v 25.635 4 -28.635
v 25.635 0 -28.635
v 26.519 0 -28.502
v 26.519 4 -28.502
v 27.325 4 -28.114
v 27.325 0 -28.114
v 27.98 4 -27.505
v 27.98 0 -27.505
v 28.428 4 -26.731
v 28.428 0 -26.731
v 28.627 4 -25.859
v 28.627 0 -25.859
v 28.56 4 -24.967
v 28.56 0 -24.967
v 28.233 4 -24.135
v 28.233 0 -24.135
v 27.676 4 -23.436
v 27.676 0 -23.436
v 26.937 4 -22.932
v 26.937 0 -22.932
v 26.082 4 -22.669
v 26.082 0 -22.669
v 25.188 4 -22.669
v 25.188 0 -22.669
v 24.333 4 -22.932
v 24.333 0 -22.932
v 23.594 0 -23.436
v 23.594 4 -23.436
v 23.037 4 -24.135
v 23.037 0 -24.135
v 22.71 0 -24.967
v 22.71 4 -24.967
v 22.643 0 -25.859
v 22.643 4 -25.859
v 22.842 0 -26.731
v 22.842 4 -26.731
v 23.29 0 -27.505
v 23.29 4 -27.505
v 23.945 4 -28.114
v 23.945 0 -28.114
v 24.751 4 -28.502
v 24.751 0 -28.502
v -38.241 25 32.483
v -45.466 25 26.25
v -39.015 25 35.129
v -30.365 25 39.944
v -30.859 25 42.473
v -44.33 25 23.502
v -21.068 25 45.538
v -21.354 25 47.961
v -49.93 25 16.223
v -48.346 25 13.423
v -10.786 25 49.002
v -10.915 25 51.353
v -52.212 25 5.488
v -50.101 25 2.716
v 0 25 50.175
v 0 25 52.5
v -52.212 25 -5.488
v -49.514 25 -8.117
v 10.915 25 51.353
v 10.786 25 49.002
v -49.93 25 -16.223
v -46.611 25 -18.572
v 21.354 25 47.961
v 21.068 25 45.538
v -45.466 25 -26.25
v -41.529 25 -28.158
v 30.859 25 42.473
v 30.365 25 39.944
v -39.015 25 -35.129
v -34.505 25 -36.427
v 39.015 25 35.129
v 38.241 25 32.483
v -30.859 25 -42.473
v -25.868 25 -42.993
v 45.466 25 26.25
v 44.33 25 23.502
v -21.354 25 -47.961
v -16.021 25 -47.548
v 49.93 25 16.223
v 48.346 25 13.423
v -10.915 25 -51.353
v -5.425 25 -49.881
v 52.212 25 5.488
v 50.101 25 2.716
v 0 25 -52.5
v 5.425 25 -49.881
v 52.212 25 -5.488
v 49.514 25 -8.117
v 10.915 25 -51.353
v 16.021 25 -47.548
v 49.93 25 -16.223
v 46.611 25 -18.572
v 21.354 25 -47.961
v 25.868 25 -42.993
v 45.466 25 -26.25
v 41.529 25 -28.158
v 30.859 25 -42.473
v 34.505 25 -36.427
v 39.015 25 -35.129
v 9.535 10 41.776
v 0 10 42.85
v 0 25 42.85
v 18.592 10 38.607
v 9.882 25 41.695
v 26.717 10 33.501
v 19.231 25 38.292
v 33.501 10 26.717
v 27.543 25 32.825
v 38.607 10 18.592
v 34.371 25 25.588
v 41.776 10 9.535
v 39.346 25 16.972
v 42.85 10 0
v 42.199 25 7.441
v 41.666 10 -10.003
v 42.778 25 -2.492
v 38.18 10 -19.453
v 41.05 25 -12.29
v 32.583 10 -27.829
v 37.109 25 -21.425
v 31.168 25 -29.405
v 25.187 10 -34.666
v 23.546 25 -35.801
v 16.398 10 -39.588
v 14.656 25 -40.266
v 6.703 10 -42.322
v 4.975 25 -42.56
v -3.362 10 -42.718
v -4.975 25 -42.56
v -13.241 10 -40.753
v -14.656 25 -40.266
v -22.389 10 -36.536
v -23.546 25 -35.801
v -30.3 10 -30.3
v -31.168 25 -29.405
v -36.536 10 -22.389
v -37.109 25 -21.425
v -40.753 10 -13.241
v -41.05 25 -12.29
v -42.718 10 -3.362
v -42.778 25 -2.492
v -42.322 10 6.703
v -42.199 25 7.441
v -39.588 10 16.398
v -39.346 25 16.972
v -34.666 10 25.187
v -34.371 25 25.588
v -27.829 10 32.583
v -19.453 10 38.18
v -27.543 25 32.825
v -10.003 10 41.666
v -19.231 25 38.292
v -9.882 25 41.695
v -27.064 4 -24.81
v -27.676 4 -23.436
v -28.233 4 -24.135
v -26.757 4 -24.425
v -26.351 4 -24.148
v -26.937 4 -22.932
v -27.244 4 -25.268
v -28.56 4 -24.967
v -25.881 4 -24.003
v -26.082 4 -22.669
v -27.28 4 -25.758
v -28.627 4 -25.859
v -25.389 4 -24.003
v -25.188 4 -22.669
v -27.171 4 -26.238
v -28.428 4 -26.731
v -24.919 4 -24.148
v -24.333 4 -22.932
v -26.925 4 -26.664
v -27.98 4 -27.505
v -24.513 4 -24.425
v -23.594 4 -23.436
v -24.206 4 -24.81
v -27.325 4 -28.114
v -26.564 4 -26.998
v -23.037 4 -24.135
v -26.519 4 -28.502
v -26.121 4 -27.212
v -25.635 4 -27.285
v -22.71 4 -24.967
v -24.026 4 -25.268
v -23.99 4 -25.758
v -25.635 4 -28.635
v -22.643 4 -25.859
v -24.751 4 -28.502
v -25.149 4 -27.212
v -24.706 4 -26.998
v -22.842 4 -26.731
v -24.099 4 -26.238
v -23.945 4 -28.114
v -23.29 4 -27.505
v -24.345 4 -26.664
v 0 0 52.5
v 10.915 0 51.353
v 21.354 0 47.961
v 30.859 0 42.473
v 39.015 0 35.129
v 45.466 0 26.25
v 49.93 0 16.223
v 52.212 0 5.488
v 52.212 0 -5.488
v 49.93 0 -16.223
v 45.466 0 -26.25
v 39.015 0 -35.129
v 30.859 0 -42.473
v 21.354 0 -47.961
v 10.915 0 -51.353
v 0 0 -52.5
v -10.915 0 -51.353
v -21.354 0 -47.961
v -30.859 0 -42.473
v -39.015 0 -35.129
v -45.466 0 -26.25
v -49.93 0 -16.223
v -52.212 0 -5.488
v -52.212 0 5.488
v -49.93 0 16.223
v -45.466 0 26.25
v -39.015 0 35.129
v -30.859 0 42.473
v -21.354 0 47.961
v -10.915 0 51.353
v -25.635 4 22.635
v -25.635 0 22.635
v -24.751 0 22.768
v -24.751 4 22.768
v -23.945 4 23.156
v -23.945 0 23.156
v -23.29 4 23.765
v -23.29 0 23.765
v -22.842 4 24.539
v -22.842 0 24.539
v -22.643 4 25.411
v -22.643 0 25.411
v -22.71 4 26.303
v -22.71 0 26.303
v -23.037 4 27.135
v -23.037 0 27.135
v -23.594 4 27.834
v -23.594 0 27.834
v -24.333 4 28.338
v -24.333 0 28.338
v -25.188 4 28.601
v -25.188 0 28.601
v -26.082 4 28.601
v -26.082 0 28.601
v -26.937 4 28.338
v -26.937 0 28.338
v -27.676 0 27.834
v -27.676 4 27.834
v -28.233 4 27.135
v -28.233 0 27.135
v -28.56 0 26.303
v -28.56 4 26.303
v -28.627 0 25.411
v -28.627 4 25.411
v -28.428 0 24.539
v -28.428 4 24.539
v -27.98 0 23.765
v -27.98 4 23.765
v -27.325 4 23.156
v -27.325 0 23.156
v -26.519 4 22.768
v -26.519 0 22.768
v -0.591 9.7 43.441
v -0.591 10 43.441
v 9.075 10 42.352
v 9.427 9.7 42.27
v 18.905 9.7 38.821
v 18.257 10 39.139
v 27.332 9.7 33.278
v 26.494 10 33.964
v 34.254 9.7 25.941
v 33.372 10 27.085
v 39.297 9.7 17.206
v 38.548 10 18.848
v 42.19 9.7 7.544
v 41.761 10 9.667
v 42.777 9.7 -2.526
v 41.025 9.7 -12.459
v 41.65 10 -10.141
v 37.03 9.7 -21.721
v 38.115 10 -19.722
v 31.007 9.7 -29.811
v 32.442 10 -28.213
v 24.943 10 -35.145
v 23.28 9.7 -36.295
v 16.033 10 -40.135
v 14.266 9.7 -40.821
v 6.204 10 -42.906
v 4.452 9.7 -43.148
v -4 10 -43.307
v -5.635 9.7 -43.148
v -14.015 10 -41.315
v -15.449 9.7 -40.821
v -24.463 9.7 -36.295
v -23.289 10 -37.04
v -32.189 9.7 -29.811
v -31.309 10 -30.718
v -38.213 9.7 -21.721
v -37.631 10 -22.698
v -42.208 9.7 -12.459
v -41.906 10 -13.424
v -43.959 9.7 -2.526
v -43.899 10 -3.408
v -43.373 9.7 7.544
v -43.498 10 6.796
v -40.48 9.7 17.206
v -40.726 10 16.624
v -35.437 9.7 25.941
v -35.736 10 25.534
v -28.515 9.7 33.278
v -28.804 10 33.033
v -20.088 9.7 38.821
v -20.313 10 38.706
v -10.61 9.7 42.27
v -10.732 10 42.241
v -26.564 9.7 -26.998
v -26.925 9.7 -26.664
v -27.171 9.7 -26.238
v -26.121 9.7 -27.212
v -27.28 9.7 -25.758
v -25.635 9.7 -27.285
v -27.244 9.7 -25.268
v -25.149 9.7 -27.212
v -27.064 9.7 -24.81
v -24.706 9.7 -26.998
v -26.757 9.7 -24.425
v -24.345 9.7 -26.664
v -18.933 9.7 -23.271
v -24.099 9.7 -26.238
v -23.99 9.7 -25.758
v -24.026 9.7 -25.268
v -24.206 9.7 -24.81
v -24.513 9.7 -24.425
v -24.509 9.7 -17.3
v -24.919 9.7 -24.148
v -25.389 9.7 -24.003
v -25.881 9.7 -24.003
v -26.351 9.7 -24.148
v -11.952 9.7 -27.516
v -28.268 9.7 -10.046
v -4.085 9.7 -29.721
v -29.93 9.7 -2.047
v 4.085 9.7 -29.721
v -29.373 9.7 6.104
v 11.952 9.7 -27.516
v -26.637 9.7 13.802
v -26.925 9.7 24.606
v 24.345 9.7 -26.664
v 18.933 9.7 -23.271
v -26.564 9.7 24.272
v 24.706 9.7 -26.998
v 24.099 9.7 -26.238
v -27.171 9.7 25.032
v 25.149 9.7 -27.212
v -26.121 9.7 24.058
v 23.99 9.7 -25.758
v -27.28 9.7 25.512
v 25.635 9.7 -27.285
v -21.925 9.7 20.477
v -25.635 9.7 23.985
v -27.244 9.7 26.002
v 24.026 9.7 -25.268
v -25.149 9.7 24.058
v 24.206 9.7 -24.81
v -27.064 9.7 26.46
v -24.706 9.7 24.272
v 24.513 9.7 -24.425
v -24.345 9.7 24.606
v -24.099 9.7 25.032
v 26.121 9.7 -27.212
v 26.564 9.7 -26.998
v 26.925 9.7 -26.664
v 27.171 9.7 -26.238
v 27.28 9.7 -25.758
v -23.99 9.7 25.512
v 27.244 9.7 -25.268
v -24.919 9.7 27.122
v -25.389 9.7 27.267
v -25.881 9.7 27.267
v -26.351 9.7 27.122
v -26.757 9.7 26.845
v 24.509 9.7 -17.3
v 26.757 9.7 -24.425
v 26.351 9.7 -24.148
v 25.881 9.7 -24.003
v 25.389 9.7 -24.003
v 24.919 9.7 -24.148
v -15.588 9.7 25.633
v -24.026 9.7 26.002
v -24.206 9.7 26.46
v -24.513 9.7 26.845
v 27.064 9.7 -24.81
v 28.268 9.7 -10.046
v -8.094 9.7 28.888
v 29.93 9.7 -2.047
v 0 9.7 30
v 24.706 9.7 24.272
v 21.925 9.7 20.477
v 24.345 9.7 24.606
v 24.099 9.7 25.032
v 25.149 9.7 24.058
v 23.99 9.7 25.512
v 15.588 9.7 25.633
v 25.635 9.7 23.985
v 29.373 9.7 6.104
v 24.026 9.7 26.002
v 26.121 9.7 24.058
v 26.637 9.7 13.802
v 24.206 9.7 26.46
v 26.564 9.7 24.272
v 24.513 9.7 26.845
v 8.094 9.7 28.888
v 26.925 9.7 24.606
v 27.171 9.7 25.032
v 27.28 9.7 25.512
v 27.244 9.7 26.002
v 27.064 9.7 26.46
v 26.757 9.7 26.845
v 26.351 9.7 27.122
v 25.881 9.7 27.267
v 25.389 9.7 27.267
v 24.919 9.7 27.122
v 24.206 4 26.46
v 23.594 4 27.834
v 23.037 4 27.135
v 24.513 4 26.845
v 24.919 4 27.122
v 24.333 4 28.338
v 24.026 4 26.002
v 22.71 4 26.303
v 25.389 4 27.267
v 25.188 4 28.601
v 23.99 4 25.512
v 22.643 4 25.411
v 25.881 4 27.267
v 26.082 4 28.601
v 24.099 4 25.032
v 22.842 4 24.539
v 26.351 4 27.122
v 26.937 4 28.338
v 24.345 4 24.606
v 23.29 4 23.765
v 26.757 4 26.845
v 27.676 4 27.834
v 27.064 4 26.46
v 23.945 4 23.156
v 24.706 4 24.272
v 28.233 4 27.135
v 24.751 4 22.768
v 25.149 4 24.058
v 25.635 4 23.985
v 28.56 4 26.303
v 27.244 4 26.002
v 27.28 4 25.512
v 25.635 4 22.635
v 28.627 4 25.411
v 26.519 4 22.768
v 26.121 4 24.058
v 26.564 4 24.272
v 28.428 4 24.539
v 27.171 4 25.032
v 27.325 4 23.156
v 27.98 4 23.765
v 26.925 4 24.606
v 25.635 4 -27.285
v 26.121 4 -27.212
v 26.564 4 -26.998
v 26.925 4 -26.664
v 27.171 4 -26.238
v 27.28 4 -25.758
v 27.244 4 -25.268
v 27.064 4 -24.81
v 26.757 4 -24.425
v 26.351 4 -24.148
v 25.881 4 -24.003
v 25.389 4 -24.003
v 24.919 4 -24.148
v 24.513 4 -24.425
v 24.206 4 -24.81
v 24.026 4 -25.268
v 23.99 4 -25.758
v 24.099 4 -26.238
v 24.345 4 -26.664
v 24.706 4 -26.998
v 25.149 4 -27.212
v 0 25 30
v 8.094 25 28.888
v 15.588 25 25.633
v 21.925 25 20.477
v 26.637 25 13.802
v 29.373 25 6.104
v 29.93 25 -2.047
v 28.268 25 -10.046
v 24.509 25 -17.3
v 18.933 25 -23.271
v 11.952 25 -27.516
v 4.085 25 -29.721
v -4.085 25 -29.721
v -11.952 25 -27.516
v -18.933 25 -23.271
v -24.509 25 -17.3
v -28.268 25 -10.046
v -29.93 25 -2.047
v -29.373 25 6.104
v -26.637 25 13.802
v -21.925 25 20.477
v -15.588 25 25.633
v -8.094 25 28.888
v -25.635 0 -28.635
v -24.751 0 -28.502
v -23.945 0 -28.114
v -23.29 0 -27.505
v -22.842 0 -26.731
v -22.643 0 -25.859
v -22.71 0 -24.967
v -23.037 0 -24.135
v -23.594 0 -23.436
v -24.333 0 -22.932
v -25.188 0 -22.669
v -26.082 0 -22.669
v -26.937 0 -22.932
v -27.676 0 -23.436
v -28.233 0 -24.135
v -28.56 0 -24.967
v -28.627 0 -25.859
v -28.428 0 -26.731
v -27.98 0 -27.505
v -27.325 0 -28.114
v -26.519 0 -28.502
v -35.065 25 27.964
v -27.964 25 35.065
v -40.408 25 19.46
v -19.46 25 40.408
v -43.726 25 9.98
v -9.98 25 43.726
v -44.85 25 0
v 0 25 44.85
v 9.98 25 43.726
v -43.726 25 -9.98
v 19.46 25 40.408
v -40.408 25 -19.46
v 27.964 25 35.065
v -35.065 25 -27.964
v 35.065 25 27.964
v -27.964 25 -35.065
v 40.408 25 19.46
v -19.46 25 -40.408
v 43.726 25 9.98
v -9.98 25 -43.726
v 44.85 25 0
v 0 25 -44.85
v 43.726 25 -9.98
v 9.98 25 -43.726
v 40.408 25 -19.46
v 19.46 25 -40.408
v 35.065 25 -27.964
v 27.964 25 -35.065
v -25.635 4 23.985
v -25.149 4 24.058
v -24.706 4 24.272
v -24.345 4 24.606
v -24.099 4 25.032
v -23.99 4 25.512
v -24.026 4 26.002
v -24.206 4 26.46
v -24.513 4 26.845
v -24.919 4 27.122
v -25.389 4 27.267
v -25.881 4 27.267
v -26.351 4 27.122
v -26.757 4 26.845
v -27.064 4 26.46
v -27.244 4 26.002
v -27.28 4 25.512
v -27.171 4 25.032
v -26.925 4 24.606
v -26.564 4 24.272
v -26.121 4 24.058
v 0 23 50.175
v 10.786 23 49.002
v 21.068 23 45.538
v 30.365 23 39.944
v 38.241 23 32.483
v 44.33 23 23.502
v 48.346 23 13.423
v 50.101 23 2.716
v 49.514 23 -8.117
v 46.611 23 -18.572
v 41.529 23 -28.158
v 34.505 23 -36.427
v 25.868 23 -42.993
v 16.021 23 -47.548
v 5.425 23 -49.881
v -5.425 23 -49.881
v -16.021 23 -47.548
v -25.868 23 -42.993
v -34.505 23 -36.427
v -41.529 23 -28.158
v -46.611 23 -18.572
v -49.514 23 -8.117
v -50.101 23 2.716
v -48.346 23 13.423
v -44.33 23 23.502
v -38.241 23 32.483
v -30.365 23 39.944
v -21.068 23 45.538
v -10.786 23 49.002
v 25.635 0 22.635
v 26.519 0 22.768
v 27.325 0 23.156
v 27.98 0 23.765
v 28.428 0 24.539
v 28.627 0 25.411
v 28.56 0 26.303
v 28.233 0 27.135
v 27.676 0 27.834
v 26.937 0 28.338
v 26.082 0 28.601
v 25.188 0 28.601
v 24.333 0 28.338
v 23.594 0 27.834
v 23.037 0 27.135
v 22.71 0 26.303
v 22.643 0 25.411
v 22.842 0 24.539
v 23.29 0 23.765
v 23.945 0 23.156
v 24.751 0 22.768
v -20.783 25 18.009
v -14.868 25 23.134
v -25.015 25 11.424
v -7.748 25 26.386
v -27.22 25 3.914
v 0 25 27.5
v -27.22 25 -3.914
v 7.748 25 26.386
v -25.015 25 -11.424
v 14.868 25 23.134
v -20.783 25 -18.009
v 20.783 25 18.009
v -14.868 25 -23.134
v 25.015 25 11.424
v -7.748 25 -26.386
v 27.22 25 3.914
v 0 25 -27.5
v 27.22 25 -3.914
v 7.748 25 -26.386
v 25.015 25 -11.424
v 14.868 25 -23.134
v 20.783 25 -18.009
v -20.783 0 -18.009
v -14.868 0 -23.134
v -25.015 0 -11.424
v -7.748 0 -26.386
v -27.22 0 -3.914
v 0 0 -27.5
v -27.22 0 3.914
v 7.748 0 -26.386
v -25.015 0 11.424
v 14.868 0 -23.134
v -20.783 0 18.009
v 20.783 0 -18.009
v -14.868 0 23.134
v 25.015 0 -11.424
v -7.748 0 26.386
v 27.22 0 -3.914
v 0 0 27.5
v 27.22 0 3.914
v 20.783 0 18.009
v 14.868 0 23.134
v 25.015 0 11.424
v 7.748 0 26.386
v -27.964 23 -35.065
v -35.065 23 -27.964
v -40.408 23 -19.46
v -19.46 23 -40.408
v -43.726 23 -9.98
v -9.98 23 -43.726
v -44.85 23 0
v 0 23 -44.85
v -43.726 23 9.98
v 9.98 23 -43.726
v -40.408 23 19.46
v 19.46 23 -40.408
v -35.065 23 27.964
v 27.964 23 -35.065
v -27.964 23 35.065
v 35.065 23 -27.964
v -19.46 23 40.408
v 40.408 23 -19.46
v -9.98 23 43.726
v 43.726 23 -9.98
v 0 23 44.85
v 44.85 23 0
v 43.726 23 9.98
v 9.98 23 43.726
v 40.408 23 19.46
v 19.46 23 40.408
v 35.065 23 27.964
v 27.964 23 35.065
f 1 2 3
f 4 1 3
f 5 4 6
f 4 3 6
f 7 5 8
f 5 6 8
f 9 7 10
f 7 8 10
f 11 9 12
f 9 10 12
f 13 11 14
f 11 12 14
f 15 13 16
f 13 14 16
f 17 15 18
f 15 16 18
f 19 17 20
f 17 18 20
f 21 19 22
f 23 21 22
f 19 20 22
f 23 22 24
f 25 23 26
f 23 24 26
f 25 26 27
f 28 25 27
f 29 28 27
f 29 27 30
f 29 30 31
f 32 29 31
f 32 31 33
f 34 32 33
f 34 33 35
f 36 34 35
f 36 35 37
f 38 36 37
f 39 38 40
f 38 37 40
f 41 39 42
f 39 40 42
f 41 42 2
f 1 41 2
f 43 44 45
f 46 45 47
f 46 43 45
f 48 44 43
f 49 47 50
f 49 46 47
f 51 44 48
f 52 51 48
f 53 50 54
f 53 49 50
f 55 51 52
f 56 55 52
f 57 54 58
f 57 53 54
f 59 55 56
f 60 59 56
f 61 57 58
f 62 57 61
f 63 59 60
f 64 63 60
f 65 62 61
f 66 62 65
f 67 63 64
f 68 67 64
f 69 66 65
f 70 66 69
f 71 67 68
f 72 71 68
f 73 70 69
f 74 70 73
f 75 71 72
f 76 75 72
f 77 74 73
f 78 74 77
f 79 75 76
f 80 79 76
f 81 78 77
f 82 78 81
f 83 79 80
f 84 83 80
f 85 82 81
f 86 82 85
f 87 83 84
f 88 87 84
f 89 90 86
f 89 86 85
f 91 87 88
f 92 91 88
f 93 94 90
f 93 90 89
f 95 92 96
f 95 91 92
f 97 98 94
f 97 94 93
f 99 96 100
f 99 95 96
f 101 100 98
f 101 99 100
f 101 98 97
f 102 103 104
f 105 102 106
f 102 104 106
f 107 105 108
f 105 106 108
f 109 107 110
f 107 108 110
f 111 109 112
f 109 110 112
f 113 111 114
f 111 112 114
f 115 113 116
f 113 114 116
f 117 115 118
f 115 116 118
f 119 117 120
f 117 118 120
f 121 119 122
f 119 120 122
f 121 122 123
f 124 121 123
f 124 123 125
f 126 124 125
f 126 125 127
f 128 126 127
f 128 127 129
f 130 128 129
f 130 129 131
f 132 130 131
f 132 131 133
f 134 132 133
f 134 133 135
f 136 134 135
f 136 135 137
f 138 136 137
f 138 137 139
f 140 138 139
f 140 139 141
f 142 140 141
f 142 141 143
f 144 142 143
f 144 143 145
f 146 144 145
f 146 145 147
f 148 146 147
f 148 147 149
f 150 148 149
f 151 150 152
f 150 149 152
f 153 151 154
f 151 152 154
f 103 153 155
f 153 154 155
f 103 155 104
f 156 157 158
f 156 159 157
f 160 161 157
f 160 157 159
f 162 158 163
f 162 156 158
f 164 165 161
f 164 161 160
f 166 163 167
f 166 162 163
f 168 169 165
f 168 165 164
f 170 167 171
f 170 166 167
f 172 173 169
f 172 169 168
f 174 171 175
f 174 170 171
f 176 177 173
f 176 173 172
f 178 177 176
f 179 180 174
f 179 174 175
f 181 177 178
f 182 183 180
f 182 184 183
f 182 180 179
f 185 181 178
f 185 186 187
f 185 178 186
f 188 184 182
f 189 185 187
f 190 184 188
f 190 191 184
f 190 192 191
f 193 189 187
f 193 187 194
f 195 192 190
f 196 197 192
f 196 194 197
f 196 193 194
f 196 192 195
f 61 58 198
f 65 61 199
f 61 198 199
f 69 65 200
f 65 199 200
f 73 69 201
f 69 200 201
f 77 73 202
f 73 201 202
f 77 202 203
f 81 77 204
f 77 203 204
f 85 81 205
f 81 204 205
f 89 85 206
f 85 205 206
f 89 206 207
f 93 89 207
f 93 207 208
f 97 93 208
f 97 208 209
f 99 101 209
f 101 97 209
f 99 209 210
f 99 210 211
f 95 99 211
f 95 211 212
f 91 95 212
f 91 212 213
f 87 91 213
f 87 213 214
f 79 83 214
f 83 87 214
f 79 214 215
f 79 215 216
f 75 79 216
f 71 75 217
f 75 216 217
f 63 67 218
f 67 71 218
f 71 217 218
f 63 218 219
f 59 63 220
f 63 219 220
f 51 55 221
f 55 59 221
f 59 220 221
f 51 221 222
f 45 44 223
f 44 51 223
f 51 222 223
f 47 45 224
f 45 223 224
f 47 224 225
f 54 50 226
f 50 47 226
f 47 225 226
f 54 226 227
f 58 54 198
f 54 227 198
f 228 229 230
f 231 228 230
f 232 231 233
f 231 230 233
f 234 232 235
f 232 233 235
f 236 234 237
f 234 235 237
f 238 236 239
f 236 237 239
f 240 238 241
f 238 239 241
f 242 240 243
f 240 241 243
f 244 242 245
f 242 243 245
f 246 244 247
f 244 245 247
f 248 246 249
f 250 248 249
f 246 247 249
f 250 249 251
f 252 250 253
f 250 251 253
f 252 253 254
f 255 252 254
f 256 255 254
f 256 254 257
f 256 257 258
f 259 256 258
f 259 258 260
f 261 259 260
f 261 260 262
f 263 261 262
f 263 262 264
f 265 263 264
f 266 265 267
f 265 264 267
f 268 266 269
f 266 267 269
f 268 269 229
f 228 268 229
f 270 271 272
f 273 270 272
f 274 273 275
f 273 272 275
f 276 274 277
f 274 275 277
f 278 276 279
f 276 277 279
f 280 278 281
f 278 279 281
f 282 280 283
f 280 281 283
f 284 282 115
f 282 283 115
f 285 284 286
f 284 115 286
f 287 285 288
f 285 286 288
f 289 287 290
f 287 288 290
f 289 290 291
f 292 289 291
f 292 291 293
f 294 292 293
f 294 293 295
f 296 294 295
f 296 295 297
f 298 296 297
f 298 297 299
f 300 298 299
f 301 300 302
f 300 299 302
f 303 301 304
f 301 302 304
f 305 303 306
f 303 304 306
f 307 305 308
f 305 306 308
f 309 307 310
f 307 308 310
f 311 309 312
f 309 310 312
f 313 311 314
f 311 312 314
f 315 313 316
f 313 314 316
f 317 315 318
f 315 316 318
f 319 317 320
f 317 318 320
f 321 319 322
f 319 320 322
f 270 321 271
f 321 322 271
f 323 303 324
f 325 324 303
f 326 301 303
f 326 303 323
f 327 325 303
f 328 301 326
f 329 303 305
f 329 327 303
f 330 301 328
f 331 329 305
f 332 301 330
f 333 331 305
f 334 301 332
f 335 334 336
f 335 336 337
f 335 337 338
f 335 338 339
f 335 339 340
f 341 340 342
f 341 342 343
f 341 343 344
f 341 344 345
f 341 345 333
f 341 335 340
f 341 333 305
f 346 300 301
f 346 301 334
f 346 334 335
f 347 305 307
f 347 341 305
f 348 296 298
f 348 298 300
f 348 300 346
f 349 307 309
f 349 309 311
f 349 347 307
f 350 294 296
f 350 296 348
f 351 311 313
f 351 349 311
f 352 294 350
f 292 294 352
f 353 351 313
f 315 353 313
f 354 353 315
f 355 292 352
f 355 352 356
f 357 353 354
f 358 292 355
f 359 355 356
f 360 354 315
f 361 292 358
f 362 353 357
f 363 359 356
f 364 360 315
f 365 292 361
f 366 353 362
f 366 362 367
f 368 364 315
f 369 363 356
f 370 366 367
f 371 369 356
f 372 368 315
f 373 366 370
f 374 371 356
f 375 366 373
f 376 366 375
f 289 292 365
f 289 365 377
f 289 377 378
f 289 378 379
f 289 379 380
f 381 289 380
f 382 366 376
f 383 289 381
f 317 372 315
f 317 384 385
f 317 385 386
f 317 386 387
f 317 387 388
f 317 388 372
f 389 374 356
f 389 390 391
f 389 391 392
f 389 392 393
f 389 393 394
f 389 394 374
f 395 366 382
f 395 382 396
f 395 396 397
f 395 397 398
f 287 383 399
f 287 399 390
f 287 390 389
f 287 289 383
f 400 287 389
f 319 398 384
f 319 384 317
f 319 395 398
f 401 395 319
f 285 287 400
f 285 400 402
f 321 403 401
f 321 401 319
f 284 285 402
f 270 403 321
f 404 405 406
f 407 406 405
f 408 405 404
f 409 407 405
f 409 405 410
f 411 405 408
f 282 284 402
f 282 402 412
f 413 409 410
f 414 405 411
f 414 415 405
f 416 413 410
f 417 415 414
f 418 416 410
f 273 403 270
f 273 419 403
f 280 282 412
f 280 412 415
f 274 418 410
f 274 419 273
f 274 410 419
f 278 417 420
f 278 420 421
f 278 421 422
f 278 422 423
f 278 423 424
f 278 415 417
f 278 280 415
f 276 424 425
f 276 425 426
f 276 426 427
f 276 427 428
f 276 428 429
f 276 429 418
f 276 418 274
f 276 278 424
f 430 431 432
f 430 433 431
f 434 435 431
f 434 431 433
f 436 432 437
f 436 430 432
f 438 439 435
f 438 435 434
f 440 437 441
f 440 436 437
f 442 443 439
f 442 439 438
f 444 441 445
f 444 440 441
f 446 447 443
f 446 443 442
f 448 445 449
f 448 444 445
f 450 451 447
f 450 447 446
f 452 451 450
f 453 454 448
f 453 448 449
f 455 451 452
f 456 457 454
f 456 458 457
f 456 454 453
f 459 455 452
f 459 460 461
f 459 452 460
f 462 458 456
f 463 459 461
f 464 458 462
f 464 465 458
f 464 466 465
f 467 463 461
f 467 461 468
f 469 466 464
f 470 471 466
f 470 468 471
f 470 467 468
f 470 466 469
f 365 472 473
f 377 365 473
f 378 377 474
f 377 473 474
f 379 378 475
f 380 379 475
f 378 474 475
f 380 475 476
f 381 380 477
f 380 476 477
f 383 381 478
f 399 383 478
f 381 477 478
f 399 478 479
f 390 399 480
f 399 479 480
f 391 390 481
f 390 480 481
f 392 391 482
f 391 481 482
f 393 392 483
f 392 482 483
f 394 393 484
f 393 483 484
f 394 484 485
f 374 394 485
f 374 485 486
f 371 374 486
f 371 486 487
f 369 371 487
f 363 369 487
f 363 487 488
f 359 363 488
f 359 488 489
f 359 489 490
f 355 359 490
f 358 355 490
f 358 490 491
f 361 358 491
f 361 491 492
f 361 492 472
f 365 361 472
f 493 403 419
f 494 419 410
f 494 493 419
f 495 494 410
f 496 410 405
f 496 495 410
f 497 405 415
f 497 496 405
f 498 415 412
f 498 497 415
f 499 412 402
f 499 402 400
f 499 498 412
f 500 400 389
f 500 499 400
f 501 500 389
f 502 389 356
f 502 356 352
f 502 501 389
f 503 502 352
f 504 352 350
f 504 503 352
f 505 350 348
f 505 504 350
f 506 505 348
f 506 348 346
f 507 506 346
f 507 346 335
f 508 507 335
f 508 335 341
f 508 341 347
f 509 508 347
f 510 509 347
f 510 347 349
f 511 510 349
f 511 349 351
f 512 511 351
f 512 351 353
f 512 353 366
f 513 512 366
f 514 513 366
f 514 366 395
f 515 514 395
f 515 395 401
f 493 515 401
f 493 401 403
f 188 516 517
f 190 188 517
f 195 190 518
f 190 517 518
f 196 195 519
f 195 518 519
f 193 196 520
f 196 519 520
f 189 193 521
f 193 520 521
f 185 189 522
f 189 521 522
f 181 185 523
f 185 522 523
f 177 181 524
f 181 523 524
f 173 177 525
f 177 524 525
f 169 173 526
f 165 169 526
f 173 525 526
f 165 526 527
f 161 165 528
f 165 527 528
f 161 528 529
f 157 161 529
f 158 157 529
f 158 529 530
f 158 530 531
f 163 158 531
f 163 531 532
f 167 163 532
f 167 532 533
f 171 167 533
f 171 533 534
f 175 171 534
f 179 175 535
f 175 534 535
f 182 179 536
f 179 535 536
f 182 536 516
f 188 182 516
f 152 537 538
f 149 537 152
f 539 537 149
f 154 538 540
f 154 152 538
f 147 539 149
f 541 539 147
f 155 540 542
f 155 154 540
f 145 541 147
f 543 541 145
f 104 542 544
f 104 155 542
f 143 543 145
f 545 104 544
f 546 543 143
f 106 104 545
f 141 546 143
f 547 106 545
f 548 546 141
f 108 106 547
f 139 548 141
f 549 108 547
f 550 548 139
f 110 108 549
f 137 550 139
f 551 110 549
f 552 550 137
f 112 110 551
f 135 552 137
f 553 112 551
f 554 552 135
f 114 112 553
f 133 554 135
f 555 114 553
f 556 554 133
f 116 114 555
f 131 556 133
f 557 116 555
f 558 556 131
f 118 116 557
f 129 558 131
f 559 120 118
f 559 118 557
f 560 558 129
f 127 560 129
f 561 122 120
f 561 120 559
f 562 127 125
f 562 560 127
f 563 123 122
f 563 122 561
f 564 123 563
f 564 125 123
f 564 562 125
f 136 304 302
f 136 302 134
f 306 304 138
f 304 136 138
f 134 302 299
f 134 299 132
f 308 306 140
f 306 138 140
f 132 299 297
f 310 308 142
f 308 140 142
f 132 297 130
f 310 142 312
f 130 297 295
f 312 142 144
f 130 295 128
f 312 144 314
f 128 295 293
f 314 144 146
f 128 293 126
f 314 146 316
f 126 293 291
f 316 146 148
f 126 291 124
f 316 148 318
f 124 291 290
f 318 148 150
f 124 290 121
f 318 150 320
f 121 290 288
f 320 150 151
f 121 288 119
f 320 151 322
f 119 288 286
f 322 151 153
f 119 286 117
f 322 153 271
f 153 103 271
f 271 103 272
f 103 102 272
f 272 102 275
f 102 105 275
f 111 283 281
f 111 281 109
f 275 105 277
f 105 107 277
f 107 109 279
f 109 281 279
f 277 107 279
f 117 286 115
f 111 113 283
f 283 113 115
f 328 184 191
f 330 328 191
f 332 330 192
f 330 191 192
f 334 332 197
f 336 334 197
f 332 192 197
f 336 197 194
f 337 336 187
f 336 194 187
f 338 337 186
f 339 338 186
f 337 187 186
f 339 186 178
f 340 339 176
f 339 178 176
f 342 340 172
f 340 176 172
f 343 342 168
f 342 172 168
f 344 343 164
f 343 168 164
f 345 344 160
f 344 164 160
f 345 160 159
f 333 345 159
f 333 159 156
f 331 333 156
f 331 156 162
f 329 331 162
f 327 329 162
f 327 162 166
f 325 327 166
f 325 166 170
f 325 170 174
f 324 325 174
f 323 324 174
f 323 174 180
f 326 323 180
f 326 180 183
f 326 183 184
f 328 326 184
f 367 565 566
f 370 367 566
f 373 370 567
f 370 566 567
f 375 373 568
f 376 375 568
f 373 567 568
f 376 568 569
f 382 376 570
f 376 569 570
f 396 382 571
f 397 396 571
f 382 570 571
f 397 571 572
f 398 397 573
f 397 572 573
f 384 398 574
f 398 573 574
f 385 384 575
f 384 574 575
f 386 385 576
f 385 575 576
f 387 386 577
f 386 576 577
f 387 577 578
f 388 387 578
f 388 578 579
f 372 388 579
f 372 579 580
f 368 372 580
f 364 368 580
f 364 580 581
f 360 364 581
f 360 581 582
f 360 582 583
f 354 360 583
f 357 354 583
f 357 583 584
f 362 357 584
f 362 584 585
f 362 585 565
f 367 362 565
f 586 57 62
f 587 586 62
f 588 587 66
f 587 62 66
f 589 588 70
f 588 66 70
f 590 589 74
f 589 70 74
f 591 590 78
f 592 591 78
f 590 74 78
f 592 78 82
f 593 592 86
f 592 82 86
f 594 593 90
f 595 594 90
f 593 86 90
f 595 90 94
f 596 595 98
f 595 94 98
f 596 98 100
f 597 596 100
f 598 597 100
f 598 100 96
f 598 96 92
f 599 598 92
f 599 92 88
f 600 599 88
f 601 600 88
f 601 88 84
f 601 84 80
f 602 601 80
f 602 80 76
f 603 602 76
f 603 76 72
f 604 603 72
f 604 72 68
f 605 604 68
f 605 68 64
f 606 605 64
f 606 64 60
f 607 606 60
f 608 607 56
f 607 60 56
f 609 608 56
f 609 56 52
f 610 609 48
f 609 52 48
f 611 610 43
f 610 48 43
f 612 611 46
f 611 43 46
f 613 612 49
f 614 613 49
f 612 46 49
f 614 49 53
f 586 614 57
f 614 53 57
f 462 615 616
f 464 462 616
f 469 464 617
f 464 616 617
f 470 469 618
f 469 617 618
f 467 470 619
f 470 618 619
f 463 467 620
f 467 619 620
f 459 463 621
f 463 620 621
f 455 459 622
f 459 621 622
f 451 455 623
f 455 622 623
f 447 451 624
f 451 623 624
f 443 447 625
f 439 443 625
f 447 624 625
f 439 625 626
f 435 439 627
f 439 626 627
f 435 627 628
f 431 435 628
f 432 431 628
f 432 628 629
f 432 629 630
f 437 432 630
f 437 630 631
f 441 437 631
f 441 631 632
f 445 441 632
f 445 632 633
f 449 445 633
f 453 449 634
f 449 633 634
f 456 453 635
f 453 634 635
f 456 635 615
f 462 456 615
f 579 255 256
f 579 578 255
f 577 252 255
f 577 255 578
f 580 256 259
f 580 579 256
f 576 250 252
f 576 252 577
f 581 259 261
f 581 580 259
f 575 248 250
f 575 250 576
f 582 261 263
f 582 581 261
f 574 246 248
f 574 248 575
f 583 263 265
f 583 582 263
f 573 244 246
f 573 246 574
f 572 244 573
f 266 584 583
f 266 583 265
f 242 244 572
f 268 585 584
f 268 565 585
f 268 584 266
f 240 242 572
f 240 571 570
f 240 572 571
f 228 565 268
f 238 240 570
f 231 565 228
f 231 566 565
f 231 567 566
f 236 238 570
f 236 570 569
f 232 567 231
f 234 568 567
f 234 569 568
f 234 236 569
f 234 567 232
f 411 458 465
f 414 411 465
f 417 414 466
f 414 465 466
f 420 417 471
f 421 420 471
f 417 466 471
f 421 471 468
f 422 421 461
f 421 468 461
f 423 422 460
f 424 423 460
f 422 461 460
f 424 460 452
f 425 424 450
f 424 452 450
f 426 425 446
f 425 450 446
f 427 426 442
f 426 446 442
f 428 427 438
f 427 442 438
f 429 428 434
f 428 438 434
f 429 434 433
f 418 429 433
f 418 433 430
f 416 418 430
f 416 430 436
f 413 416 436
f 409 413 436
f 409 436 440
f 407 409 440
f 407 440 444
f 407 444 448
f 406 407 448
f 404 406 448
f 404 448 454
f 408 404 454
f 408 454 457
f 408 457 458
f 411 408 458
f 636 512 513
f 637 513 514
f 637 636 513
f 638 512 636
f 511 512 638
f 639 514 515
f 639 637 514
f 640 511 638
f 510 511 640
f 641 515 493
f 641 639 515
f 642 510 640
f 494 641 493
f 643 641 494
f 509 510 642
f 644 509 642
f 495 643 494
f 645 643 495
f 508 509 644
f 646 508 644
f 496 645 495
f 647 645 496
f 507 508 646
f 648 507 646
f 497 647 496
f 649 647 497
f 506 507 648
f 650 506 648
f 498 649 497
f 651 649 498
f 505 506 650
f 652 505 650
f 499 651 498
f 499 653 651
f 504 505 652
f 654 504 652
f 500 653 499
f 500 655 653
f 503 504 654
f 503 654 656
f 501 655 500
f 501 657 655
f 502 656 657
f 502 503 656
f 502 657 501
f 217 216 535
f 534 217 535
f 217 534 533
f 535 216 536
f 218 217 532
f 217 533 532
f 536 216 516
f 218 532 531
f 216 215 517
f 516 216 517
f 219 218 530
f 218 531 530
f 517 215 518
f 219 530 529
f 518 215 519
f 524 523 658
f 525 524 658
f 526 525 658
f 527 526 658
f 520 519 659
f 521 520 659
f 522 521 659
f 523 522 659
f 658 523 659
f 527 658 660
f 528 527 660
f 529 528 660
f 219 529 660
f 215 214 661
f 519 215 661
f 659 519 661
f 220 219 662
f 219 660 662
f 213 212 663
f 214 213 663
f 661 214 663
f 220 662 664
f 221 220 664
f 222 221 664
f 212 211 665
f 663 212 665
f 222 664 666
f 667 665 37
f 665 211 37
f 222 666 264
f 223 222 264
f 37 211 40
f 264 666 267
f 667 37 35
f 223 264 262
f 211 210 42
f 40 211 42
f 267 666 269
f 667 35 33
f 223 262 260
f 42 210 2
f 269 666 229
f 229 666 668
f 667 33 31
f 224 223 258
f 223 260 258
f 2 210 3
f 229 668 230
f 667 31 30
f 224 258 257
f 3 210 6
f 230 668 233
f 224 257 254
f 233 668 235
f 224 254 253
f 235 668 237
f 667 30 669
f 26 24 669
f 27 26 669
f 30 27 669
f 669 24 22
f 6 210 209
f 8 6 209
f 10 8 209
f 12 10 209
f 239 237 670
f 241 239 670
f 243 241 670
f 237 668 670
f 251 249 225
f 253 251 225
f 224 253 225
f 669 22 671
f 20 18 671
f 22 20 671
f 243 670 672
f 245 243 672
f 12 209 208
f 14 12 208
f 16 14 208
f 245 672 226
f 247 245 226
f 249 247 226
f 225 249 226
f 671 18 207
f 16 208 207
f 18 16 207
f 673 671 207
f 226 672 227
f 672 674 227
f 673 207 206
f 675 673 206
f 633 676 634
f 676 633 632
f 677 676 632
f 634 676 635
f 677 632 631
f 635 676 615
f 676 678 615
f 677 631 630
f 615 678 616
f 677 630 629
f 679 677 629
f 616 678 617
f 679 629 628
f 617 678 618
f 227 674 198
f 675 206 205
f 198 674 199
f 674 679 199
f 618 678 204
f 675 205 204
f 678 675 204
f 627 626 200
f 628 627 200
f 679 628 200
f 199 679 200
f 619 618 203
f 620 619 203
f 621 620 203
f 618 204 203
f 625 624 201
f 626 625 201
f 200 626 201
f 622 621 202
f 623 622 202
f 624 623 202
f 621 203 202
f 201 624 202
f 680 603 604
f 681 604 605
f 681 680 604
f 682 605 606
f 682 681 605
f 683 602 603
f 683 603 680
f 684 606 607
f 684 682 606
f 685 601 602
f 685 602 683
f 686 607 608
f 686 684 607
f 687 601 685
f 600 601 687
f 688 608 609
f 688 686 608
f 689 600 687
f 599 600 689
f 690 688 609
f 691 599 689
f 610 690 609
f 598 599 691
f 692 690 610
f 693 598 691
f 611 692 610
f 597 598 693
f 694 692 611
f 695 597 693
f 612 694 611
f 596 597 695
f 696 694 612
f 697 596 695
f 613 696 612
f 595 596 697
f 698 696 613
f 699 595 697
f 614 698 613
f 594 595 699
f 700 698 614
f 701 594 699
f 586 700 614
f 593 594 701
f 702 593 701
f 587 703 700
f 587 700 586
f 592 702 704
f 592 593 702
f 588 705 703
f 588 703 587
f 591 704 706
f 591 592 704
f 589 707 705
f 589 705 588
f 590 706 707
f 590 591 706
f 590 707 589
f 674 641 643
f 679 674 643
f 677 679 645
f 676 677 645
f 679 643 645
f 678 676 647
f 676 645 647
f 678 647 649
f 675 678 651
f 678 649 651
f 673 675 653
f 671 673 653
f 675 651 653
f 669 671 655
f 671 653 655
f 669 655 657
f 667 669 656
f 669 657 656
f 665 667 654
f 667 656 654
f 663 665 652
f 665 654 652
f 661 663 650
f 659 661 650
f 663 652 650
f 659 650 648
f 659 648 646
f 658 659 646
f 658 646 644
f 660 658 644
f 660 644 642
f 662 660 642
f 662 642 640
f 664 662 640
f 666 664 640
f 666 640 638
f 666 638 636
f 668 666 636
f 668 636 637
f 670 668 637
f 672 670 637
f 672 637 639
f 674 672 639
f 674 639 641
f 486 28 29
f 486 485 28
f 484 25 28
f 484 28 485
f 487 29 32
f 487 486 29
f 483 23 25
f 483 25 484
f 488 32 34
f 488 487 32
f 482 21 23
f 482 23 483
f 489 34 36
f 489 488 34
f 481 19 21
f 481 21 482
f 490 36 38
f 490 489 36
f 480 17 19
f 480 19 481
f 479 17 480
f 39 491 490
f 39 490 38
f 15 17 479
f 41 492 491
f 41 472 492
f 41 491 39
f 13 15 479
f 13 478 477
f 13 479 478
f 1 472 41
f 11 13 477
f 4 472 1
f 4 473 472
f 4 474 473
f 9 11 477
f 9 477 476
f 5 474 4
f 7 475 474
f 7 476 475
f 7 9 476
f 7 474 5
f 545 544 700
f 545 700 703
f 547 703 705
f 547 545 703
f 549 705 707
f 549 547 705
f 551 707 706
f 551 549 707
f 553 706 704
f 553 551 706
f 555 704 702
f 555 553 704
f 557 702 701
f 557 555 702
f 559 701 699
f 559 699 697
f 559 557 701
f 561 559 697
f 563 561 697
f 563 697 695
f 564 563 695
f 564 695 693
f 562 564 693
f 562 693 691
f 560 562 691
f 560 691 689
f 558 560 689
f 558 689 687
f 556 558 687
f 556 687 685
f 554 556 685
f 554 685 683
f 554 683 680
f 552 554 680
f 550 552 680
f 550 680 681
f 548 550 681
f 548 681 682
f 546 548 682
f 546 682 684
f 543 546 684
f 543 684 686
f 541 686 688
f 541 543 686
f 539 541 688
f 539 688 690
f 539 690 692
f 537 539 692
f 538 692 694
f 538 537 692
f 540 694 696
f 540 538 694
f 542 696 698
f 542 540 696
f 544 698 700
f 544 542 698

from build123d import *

# Parameters (mm, degrees)
SKETCH1_R           = 52.5
BOSS_EXTRUDE1_DEPTH = 30
SKETCH2_R           = 50.175
SKETCH2_R_2         = 44.85
CUT_EXTRUDE1_DEPTH  = 7
SKETCH3_R           = 42.85
SKETCH3_R_2         = 30
CUT_EXTRUDE2_DEPTH  = 20
SKETCH6_R           = 27.5
CUT_EXTRUDE6_DEPTH  = 81.07808689
SKETCH9_R           = 1.65
CUT_EXTRUDE7_DEPTH  = 10
SKETCH10_R          = 3
CUT_EXTRUDE8_DEPTH  = 4
SKETCH12_W          = 130.559751652
SKETCH12_H          = 125.592804578
CUT_EXTRUDE9_DEPTH  = 5
SKETCH13_R          = 43.441303223
SKETCH13_R_2        = 30
CUT_EXTRUDE10_DEPTH = 0.3


with BuildPart() as part:
    # Sketch1 → Boss-Extrude1 (new body)
    with BuildSketch(Plane(origin=(0, 0, 0), x_dir=(1, 0, 0), z_dir=(0, 1, 0))):
        Circle(SKETCH1_R)
    extrude(amount=BOSS_EXTRUDE1_DEPTH)

    # Sketch2 → Cut-Extrude1 (cut)
    with BuildSketch(Plane(origin=(0, 30, 0), x_dir=(1, 0, 0), z_dir=(0, 1, 0))):
        Circle(SKETCH2_R)
        Circle(SKETCH2_R_2, mode=Mode.SUBTRACT)
    extrude(amount=-CUT_EXTRUDE1_DEPTH, mode=Mode.SUBTRACT)

    # Sketch3 → Cut-Extrude2 (cut)
    with BuildSketch(Plane(origin=(0, 30, 0), x_dir=(1, 0, 0), z_dir=(0, 1, 0))):
        Circle(SKETCH3_R)
        Circle(SKETCH3_R_2, mode=Mode.SUBTRACT)
    extrude(amount=-CUT_EXTRUDE2_DEPTH, mode=Mode.SUBTRACT)

    # Sketch6 → Cut-Extrude6 (cut, through all)
    with BuildSketch(Plane(origin=(0, 30, 0), x_dir=(1, 0, 0), z_dir=(0, 1, 0))):
        Circle(SKETCH6_R)
    extrude(amount=-CUT_EXTRUDE6_DEPTH, mode=Mode.SUBTRACT)

    # Sketch9 → Cut-Extrude7 (cut)
    with BuildSketch(Plane.XZ):
        with Locations((-25.635, 25.635)):
            Circle(SKETCH9_R)
        with Locations((25.635, 25.635)):
            Circle(SKETCH9_R)
        with Locations((25.635, -25.635)):
            Circle(SKETCH9_R)
        with Locations((-25.635, -25.635)):
            Circle(SKETCH9_R)
    extrude(amount=-CUT_EXTRUDE7_DEPTH, mode=Mode.SUBTRACT)

    # Sketch10 → Cut-Extrude8 (cut)
    with BuildSketch(Plane.XZ):
        with Locations((-25.635, 25.635)):
            Circle(SKETCH10_R)
        with Locations((25.635, 25.635)):
            Circle(SKETCH10_R)
        with Locations((25.635, -25.635)):
            Circle(SKETCH10_R)
        with Locations((-25.635, -25.635)):
            Circle(SKETCH10_R)
    extrude(amount=-CUT_EXTRUDE8_DEPTH, mode=Mode.SUBTRACT)

    # Sketch12 → Cut-Extrude9 (cut)
    with BuildSketch(Plane(origin=(0, 30, 0), x_dir=(1, 0, 0), z_dir=(0, 1, 0))):
        Rectangle(SKETCH12_W, SKETCH12_H)
    extrude(amount=-CUT_EXTRUDE9_DEPTH, mode=Mode.SUBTRACT)

    # Sketch13 → Cut-Extrude10 (cut)
    with BuildSketch(Plane(origin=(0, 10, 0), x_dir=(1, 0, 0), z_dir=(0, 1, 0))):
        with Locations((-0.591303223, 0)):
            Circle(SKETCH13_R)
        Circle(SKETCH13_R_2, mode=Mode.SUBTRACT)
    extrude(amount=-CUT_EXTRUDE10_DEPTH, mode=Mode.SUBTRACT)


solid = part.part
